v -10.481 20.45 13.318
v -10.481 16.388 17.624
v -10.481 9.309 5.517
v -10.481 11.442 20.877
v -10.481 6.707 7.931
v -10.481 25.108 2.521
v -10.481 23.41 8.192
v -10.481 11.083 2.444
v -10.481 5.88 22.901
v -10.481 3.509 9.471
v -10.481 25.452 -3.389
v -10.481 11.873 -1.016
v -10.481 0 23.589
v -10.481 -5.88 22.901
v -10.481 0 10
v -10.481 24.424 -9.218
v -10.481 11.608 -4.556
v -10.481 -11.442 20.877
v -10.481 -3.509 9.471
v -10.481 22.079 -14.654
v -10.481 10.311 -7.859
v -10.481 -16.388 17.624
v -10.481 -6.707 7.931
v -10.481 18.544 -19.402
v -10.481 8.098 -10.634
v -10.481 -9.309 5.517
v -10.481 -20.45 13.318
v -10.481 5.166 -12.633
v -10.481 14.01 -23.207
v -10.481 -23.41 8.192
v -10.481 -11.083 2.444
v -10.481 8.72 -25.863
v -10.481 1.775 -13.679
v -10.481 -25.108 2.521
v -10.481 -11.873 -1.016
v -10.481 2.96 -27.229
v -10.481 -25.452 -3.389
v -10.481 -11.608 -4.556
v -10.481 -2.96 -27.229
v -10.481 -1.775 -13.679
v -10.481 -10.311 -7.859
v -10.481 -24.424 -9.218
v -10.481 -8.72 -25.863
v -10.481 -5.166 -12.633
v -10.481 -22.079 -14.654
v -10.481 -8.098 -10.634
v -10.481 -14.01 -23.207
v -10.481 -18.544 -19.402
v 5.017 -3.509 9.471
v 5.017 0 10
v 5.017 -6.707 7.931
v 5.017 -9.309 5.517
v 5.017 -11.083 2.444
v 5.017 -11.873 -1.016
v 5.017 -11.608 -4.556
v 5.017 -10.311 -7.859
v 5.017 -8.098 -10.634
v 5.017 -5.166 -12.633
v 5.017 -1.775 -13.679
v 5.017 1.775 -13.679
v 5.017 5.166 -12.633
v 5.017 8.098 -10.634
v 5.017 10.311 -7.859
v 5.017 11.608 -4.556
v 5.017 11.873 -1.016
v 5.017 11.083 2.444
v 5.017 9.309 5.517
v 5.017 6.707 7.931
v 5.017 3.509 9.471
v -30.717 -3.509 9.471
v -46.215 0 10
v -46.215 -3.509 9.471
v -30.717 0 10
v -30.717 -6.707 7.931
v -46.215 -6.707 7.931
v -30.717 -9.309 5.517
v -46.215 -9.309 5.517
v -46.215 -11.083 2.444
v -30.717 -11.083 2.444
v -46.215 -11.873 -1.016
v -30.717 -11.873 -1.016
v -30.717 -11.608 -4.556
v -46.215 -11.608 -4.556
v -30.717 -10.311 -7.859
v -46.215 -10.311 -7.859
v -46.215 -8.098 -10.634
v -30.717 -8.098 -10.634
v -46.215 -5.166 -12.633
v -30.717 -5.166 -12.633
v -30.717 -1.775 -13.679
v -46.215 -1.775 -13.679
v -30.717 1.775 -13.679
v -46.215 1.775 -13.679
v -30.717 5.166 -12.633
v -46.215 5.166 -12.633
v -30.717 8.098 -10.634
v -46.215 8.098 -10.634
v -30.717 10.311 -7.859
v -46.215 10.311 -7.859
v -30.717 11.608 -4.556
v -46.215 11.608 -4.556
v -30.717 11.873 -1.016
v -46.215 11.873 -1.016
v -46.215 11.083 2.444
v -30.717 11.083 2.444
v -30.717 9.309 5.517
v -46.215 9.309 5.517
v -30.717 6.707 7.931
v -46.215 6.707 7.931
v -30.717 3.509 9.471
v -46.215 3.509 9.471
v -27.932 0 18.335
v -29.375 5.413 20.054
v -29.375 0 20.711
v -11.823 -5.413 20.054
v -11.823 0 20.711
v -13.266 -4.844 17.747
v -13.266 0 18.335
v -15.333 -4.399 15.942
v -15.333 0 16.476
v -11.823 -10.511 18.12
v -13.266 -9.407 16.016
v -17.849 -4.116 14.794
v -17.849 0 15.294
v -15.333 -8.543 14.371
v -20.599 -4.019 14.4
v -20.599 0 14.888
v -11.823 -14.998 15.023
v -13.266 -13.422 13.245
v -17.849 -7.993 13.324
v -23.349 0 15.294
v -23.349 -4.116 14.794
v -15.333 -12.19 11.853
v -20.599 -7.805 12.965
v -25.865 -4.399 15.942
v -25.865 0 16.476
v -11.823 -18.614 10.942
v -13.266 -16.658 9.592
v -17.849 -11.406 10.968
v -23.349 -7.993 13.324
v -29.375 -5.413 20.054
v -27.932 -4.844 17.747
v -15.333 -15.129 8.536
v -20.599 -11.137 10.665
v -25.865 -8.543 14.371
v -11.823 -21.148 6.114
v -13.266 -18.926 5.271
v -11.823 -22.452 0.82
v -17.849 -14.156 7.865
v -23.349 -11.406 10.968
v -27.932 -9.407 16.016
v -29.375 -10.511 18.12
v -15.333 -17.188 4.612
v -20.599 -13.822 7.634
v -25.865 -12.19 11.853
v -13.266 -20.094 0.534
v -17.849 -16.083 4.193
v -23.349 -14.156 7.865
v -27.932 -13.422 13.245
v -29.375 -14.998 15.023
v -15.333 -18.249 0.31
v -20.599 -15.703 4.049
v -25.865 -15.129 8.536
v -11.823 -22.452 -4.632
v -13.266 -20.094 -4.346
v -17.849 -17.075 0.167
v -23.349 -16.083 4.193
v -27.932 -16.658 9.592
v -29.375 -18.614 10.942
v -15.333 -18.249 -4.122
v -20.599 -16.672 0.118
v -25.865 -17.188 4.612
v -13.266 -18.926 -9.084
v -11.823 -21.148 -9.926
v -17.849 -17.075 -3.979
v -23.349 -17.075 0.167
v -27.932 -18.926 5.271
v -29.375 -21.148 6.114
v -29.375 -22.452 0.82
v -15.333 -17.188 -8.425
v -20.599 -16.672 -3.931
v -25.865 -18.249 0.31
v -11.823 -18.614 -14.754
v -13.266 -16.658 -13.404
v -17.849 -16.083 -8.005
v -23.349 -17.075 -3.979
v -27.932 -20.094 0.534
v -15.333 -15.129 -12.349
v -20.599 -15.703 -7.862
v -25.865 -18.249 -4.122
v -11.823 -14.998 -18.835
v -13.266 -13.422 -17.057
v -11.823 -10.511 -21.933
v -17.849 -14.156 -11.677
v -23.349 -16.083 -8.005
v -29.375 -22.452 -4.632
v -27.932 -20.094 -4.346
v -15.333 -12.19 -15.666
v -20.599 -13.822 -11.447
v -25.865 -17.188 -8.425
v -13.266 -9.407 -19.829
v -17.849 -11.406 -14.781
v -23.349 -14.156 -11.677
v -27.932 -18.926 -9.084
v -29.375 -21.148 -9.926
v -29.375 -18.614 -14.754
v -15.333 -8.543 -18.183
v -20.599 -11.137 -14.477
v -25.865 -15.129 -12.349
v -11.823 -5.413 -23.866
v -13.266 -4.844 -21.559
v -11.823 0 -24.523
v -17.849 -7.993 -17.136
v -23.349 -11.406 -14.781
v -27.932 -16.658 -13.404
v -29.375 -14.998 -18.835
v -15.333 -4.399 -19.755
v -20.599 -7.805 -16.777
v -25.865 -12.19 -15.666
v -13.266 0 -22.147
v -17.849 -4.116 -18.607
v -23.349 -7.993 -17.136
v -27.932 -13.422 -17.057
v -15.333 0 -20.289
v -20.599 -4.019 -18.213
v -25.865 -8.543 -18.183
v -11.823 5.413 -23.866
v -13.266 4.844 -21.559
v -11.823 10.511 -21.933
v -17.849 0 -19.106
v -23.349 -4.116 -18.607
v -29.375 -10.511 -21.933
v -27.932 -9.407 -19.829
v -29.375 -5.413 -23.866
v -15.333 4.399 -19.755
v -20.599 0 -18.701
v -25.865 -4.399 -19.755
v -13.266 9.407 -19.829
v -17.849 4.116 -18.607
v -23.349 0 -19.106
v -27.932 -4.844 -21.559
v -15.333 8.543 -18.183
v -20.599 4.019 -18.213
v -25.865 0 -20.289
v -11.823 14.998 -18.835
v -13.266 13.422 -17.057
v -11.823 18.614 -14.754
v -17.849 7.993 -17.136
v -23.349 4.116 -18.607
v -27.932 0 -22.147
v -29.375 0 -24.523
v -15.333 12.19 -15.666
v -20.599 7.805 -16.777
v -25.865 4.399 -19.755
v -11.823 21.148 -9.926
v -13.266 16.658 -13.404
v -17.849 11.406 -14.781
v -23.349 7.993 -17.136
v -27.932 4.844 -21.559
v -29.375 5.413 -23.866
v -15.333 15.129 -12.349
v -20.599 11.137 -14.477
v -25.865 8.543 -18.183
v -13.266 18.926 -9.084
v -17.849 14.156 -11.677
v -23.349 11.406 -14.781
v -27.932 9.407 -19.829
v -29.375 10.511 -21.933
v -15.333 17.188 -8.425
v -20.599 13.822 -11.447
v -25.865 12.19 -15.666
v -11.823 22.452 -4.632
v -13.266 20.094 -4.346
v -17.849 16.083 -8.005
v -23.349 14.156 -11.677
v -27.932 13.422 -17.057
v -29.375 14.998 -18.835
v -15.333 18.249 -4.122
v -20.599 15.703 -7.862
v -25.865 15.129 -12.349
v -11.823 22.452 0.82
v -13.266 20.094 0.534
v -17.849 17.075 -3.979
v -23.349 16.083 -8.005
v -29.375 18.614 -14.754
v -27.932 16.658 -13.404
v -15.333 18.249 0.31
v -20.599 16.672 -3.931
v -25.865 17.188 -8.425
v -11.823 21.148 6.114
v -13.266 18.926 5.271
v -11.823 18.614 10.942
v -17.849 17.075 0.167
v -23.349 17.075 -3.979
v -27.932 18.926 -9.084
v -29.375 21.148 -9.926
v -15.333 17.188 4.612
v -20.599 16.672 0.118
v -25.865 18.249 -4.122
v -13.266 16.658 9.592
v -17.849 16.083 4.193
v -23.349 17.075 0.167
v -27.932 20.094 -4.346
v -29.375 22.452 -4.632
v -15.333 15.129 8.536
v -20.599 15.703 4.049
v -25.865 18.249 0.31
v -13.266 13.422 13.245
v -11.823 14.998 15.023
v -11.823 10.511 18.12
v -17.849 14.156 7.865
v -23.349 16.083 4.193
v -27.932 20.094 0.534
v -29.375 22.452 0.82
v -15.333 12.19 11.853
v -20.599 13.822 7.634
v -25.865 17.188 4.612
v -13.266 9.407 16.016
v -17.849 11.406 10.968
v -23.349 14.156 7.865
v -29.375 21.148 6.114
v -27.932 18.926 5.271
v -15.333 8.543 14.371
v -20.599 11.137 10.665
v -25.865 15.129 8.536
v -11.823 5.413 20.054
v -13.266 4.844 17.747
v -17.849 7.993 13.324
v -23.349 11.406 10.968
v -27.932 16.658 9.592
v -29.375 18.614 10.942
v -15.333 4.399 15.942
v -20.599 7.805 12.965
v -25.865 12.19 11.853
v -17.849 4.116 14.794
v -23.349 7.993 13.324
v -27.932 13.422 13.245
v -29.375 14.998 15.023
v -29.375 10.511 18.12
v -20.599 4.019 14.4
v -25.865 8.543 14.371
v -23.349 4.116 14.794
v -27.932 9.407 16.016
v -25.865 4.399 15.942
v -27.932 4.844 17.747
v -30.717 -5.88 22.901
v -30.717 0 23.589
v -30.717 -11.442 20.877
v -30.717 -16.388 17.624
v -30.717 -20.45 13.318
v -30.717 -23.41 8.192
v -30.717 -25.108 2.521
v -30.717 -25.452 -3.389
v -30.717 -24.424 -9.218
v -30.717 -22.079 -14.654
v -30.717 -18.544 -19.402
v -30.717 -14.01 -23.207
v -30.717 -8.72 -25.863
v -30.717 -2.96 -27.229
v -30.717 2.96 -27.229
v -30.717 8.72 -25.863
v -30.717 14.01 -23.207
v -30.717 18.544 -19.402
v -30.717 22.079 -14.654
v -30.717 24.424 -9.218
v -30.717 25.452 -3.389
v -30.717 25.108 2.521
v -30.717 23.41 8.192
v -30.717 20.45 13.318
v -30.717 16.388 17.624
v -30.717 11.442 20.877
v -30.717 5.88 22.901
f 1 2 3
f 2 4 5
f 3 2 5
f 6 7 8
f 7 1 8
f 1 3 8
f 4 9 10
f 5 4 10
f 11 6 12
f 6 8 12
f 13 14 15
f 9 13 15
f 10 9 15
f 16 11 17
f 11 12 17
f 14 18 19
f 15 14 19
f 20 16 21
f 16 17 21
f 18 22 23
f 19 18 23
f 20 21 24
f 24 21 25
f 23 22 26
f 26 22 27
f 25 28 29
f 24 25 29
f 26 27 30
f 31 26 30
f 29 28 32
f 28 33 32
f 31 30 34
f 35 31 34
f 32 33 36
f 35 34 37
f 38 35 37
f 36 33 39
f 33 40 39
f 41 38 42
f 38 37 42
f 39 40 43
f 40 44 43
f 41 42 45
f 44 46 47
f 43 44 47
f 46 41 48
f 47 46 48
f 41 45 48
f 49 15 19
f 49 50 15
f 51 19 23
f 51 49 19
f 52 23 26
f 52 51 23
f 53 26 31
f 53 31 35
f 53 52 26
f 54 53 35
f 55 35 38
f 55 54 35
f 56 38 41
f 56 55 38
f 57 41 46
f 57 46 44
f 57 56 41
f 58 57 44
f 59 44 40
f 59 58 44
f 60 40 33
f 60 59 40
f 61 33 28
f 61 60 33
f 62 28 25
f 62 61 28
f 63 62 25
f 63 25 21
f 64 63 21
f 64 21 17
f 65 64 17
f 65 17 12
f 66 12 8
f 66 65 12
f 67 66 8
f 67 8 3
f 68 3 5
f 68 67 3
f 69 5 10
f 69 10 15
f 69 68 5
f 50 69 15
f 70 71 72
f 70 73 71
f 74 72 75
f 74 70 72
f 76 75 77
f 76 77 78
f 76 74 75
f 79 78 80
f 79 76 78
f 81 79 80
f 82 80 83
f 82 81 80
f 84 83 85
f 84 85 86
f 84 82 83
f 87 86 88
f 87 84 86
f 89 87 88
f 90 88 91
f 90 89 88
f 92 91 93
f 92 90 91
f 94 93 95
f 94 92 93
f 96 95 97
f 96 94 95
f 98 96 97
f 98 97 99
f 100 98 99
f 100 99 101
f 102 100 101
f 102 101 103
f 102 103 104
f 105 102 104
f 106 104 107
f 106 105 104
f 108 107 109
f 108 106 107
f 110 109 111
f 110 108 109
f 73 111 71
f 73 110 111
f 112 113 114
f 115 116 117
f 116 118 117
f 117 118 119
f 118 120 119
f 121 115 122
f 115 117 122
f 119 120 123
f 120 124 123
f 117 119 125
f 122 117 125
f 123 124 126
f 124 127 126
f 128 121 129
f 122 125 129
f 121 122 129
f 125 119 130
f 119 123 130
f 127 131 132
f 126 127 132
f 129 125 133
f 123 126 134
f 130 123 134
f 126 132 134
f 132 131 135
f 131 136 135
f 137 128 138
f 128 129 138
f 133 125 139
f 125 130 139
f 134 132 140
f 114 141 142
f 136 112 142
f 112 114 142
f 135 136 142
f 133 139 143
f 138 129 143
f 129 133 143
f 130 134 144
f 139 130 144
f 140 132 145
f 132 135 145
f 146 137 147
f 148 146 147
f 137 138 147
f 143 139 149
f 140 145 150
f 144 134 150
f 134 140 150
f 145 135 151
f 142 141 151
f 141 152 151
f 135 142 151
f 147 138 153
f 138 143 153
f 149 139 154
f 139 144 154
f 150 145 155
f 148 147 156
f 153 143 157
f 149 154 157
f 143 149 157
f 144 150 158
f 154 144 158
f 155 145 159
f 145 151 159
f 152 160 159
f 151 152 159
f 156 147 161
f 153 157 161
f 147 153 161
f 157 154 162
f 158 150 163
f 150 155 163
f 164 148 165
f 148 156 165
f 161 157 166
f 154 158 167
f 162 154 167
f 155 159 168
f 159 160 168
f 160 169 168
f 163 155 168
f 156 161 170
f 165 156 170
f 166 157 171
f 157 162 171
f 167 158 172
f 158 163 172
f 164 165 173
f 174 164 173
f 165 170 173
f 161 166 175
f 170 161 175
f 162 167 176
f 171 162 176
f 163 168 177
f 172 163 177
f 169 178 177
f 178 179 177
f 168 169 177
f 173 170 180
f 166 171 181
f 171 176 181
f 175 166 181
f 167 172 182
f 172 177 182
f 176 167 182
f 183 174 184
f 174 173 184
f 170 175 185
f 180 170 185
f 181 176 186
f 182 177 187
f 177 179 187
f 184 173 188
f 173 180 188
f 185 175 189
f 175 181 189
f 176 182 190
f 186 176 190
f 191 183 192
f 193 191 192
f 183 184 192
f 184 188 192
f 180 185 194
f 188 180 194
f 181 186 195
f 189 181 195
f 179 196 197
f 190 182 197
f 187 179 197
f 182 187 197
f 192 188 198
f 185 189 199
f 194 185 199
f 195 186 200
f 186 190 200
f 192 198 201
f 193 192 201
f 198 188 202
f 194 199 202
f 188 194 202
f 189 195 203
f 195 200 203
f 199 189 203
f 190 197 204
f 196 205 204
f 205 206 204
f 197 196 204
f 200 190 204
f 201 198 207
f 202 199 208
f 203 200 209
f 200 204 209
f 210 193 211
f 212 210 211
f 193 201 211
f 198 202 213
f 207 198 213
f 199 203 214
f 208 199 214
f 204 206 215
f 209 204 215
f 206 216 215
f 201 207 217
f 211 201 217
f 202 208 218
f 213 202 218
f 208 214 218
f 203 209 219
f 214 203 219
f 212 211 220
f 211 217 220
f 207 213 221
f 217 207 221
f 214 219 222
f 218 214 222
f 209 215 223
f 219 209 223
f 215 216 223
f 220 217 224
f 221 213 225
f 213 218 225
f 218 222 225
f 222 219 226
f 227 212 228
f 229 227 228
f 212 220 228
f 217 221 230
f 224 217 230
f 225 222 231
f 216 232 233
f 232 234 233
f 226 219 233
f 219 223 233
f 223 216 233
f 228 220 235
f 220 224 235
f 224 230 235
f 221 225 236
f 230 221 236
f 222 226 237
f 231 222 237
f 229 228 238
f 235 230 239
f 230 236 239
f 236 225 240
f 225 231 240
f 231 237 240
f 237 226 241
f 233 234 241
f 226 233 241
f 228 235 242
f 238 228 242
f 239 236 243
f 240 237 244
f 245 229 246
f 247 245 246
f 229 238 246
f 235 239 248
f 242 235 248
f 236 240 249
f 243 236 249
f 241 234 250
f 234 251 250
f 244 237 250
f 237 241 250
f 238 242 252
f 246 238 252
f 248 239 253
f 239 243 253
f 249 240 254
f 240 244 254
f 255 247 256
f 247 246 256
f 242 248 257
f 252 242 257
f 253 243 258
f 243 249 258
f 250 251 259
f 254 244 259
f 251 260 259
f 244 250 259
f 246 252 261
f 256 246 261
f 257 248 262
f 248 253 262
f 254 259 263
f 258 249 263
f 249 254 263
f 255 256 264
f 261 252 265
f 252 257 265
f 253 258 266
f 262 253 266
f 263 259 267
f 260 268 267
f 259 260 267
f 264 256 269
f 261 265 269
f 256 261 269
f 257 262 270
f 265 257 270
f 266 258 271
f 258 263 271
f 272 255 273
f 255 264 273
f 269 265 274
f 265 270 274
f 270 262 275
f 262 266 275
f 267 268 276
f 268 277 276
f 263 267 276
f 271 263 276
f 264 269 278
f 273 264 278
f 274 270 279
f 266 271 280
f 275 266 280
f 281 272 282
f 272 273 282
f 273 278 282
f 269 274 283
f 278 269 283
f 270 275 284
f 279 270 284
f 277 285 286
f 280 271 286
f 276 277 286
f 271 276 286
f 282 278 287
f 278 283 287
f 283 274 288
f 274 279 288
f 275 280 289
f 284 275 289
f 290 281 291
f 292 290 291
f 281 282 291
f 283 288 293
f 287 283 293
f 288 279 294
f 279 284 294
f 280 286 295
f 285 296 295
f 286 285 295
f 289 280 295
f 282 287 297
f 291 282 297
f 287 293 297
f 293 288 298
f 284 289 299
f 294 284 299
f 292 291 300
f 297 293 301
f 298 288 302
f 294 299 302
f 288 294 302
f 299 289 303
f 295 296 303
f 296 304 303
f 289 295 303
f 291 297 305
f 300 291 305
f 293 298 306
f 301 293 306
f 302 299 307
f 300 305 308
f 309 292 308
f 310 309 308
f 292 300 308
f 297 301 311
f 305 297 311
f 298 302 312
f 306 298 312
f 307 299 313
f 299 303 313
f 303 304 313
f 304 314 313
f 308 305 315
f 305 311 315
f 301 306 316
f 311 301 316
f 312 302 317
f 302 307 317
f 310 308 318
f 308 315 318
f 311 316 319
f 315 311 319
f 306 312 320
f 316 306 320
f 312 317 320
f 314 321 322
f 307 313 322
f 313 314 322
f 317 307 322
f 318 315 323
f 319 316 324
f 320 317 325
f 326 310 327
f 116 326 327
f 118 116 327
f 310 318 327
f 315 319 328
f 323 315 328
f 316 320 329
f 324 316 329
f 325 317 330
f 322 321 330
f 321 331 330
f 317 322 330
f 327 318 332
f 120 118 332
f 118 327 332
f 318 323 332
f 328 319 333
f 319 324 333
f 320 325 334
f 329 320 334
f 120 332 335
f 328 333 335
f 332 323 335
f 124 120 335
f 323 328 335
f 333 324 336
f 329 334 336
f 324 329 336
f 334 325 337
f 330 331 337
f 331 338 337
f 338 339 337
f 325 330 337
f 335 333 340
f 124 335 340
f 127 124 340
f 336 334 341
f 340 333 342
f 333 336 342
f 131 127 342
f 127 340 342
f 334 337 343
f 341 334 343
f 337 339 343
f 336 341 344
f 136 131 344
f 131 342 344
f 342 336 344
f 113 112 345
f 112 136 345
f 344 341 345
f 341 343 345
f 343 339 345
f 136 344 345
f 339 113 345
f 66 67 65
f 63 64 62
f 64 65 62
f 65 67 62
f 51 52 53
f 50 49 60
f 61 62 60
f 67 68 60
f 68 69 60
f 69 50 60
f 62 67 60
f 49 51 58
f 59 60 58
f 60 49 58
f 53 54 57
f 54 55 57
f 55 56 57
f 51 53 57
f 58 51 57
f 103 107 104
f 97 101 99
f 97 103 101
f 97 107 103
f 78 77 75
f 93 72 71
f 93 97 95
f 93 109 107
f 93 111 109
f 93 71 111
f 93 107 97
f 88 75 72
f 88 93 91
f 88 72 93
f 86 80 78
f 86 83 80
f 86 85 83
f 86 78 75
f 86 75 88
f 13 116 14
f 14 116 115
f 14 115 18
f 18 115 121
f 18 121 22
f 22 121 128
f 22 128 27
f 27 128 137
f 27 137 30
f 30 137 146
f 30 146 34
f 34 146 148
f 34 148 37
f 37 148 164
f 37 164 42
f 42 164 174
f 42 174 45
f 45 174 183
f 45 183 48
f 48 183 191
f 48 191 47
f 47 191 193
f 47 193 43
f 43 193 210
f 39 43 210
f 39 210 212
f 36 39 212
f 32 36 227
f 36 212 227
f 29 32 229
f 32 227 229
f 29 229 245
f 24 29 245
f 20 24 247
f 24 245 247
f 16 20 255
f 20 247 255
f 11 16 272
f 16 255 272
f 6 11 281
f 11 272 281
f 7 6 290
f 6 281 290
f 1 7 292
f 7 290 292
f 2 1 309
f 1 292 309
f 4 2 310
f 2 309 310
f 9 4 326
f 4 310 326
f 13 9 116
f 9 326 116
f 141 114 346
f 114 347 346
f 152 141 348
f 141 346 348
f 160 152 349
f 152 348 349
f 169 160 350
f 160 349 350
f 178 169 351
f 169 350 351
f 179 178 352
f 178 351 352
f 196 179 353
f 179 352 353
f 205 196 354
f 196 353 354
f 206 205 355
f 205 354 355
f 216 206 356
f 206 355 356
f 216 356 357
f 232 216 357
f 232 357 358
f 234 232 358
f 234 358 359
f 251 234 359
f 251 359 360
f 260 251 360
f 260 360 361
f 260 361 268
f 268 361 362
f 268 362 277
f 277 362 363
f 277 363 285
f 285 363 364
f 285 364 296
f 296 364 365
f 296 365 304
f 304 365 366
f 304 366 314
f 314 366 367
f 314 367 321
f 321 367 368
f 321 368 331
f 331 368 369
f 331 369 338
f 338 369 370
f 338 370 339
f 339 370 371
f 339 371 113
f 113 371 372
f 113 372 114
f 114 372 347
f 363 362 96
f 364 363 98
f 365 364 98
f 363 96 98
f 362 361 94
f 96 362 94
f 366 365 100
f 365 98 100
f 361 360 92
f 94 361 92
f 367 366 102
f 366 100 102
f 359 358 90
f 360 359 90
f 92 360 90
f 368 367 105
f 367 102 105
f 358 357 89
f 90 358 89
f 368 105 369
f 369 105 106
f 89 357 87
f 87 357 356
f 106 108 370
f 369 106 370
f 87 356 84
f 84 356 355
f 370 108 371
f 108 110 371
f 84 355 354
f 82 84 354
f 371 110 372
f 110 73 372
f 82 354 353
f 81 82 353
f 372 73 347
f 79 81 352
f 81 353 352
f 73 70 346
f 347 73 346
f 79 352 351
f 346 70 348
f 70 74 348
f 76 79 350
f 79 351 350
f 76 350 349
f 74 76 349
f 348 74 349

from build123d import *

# Parameters (mm, degrees)
F0_W = 15.4980453622
F0_H = 11.90625


with BuildPart() as f1:
    # F0 (on Front) → F1 (revolve)
    with BuildSketch(Plane.XZ):
        with BuildLine():
            Line((-29.3751272816, 20.7111547367), (-30.7169402626, 23.5886819605))
            Line((-30.7169402626, 23.5886819605), (-30.7169402626, 10.0000788365))
            Line((-30.7169402626, 10.0000788365), (-30.7169402626, -1.9061711635))
            Line((-30.7169402626, -1.9061711635), (-10.4812309871, -1.9061711635))
            Line((-10.4812309871, -1.9061711635), (-10.4812309871, 10.0000788365))
            Line((-10.4812309871, 10.0000788365), (-10.4812309871, 23.5886819605))
            Line((-10.4812309871, 23.5886819605), (-11.8230439681, 20.7111547367))
            ThreePointArc((-11.8230439681, 20.7111547367), (-20.5990856249, 14.8884132148), (-29.3751272816, 20.7111547367))
        make_face()
        with Locations((-38.4659629438, 4.0469538365)):
            Rectangle(F0_W, F0_H)
        with Locations((-2.732208306, 4.0469538365)):
            Rectangle(F0_W, F0_H)
    revolve(axis=Axis((-19.7645360604, 0, -1.9061711635), (1, 0, 0)))


solid = f1.part
